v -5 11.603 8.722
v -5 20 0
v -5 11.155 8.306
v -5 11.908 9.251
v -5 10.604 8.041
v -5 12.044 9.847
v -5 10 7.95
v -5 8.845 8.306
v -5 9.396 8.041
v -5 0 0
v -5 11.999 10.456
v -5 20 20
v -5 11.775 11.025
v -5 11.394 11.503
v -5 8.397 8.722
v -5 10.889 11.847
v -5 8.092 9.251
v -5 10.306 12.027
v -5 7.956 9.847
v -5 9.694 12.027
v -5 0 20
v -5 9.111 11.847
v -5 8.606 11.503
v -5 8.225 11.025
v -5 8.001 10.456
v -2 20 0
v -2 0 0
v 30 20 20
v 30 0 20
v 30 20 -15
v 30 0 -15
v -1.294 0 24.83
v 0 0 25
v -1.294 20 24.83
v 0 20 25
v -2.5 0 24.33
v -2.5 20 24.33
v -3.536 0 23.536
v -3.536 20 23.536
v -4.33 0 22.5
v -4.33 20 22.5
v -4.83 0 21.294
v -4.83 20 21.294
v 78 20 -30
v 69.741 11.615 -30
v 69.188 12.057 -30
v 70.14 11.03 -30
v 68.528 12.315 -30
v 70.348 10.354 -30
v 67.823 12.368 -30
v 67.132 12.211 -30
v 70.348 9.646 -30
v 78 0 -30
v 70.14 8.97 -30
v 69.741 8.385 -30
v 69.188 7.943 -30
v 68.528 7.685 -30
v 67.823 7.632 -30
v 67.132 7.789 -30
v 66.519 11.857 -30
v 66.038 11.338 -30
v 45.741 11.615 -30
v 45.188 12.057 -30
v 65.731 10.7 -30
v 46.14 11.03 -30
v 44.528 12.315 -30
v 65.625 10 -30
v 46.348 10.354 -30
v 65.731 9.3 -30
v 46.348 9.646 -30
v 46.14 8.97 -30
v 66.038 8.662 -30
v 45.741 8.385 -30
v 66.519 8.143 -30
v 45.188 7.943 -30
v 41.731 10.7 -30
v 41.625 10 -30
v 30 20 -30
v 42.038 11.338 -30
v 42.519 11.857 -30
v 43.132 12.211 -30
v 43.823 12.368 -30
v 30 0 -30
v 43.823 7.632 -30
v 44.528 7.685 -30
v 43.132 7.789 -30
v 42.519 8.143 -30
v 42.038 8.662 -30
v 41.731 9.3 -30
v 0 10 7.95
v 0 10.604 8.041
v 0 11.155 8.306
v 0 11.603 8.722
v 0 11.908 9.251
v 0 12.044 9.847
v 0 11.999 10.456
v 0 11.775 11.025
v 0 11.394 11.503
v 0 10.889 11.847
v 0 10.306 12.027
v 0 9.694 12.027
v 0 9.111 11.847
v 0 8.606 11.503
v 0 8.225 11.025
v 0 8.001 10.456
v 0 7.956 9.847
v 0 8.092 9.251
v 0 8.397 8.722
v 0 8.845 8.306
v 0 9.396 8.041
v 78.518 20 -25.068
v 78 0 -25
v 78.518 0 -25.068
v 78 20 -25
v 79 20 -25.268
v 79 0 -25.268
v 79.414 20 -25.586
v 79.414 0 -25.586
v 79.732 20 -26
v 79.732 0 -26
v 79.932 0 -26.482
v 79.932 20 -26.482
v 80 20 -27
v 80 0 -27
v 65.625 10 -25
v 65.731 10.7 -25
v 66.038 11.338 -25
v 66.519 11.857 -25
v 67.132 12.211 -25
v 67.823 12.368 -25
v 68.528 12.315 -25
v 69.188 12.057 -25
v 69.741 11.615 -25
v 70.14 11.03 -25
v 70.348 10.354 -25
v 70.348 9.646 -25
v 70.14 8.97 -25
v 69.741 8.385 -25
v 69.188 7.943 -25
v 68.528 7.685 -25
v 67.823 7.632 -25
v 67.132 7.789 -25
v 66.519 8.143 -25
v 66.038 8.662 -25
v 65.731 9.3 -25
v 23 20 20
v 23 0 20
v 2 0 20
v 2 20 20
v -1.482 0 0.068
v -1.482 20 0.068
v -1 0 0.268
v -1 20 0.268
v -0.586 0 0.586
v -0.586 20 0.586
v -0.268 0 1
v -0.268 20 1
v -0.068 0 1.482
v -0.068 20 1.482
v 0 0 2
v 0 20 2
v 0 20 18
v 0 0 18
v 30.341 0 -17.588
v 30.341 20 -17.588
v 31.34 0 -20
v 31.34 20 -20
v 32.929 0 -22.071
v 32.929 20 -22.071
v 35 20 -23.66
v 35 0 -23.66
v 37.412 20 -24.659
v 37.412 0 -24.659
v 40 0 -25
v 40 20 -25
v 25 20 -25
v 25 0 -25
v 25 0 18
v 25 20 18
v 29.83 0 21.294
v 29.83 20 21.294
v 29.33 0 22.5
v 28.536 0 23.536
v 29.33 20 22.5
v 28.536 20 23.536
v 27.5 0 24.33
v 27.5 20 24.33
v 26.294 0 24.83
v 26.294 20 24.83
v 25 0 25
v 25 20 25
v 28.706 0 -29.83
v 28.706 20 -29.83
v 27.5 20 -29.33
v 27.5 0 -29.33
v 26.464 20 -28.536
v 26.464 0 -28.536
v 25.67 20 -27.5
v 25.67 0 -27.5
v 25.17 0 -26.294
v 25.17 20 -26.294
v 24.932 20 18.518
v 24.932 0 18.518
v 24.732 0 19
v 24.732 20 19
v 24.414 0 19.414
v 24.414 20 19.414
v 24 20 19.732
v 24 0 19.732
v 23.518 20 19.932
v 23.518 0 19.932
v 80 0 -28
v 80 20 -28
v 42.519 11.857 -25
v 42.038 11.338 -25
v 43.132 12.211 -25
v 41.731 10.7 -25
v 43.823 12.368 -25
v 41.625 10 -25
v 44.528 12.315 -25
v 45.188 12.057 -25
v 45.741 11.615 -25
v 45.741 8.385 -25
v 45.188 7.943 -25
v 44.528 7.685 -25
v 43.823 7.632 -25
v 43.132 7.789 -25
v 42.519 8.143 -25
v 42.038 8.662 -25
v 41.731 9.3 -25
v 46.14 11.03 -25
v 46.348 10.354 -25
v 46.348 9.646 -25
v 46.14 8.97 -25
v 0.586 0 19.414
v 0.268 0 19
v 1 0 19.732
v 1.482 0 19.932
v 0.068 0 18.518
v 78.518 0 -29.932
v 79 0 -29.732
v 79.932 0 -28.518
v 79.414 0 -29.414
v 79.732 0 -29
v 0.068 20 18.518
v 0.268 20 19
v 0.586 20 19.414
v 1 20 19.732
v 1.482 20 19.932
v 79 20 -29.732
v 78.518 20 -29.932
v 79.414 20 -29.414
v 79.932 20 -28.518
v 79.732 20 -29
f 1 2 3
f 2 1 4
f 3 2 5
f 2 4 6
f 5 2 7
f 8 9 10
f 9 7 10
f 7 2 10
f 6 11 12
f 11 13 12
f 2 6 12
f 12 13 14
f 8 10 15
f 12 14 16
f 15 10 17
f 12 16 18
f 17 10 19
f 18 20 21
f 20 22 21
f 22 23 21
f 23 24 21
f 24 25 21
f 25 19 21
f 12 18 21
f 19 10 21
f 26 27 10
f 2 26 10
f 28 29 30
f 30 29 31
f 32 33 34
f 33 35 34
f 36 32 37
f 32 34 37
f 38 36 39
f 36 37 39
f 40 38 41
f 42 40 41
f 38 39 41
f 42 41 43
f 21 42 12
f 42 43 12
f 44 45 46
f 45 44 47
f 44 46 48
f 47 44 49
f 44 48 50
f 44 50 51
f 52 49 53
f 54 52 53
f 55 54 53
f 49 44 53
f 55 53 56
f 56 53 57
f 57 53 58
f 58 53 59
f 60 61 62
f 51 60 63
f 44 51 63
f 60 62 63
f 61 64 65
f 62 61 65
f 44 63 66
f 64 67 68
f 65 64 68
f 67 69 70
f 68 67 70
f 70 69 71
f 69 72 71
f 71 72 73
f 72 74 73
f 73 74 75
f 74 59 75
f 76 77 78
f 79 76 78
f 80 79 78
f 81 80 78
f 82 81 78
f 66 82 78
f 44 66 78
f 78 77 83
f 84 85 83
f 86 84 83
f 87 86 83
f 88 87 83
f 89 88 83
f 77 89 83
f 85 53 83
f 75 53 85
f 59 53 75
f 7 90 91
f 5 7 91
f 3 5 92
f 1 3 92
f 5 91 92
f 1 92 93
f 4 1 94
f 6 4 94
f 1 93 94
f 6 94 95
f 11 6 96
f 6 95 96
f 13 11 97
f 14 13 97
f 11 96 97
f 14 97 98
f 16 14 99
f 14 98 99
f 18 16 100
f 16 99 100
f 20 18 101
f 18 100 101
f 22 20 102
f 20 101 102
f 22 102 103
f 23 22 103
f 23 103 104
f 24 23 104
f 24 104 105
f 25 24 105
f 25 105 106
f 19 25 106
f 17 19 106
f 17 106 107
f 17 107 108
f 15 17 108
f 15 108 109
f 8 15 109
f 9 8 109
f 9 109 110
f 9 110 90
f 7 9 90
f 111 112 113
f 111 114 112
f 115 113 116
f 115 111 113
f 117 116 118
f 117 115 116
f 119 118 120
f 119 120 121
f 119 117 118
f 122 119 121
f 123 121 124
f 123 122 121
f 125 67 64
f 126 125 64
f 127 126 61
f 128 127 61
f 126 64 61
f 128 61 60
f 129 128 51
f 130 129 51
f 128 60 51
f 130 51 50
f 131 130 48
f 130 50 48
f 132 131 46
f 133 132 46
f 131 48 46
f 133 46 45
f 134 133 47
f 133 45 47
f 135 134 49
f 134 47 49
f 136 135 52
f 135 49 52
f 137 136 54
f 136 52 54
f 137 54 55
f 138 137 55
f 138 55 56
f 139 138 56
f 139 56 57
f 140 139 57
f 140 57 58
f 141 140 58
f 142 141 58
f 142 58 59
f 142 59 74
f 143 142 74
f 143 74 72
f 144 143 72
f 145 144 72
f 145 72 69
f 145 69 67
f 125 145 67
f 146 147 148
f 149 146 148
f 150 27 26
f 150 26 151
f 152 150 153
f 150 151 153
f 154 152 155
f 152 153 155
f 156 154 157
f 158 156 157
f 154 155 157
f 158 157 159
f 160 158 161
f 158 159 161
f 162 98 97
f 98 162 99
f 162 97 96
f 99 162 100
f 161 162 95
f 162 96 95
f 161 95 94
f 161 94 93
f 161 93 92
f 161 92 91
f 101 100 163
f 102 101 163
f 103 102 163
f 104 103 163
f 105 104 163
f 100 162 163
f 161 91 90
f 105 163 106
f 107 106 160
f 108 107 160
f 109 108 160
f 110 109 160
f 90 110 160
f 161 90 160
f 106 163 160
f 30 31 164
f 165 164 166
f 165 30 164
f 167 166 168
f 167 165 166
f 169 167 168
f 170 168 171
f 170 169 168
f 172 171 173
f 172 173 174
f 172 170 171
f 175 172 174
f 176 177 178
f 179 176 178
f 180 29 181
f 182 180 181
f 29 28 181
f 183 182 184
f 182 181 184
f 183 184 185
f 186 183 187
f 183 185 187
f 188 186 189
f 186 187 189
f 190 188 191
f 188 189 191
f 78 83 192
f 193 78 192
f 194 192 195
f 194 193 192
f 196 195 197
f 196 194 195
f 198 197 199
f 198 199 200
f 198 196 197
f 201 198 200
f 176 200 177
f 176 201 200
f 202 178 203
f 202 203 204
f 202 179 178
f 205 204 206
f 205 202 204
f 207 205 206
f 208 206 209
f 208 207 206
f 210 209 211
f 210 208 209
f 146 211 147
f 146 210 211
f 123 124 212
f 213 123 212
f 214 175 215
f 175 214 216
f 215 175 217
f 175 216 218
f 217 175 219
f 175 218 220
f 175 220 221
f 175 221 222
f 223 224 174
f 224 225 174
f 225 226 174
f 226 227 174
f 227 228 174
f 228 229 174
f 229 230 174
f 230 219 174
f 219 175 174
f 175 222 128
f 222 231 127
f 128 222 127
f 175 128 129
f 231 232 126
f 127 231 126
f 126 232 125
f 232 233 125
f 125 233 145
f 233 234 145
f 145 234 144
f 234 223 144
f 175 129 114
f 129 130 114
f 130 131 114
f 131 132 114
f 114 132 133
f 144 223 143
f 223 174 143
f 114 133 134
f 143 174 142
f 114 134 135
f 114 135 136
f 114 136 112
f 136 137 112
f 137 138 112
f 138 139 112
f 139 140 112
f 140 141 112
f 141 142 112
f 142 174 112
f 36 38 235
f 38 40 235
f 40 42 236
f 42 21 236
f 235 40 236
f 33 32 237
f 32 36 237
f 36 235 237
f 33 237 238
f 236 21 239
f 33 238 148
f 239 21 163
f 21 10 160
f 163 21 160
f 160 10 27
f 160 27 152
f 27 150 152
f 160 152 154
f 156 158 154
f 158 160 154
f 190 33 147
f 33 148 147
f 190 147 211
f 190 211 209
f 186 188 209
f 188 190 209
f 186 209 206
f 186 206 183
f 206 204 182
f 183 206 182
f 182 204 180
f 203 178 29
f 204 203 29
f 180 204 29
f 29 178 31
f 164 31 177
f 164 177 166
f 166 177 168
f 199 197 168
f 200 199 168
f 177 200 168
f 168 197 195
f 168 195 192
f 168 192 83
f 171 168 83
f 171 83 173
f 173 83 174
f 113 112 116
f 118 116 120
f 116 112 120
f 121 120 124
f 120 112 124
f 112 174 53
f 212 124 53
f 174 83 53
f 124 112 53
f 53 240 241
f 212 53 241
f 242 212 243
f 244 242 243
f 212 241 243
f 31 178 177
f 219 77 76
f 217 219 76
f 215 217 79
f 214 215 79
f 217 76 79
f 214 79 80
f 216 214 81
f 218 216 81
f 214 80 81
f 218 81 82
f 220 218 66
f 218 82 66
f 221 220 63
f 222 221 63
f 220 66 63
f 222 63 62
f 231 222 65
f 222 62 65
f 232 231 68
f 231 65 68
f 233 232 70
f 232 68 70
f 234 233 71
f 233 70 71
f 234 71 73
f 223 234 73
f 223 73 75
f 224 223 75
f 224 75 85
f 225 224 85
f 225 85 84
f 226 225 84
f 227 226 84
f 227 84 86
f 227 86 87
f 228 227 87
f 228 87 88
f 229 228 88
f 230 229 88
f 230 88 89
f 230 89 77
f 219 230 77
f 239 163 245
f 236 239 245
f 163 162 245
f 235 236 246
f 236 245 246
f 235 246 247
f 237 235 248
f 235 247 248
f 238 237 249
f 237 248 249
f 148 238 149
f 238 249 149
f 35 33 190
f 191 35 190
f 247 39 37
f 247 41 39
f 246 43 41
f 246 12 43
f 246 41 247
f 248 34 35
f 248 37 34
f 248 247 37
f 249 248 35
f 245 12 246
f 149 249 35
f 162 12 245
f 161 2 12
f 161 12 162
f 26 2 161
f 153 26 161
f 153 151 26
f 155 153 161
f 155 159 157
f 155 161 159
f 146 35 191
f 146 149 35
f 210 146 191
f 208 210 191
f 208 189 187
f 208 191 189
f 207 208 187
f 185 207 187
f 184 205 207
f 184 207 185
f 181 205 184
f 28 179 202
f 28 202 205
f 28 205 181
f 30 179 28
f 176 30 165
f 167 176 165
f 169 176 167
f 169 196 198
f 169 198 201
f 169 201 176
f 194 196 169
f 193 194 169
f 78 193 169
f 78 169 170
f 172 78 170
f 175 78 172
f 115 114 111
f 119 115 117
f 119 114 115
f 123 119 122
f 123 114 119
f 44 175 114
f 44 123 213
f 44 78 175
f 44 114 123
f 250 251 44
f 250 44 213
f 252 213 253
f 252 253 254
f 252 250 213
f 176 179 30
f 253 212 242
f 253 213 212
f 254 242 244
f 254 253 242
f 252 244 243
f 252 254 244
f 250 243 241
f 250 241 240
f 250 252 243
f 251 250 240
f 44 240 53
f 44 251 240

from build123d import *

# Parameters (mm, degrees)
BOSS_EXTRUDE1_DEPTH = 20
SKETCH2_R           = 2.05
CUT_EXTRUDE1_DEPTH  = 88.749643874
SKETCH3_R           = 2.375
CUT_EXTRUDE2_DEPTH  = 100.121138008
FILLET1_R           = 10
FILLET2_R           = 5
FILLET3_R           = 2


with BuildPart() as part:
    # Sketch1 → Boss-Extrude1 (new body)
    with BuildSketch(Plane(origin=(0, 0, 0), x_dir=(1, 0, 0), z_dir=(0, 1, 0))):
        Polygon((0, 0), (-5, 0), (-5, -25), (30, -25), (30, -0.579896907), (30, 25), (80, 25), (80, 30), (25, 30), (25, -20), (0, -20), align=None)
    extrude(amount=BOSS_EXTRUDE1_DEPTH)

    # Sketch2 → Cut-Extrude1 (cut, through all)
    with BuildSketch(Plane(origin=(0, 0, 0), x_dir=(0, 0, -1), z_dir=(1, 0, 0))):
        with Locations((-10, 10)):
            Circle(SKETCH2_R)
    extrude(amount=-CUT_EXTRUDE1_DEPTH, mode=Mode.SUBTRACT)

    # Sketch3 → Cut-Extrude2 (cut, through all)
    with BuildSketch(Plane(origin=(0, 0, -30), x_dir=(-1, 0, 0), z_dir=(0, 0, -1))):
        with Locations((-68, 10)):
            Circle(SKETCH3_R)
        with Locations((-44, 10)):
            Circle(SKETCH3_R)
    extrude(amount=-CUT_EXTRUDE2_DEPTH, mode=Mode.SUBTRACT)

    # Fillet1
    fillet1_edges = [part.edges().sort_by_distance(p)[0] for p in [
        (30, 10, -25),
    ]]
    fillet(fillet1_edges, radius=FILLET1_R)

    # Fillet2
    fillet2_edges = [part.edges().sort_by_distance(p)[0] for p in [
        (25, 10, -30),
        (30, 10, 25),
        (-5, 10, 25),
    ]]
    fillet(fillet2_edges, radius=FILLET2_R)

    # Fillet3
    fillet3_edges = [part.edges().sort_by_distance(p)[0] for p in [
        (0, 10, 20),
        (25, 10, 20),
        (80, 10, -30),
        (80, 10, -25),
        (0, 10, 0),
    ]]
    fillet(fillet3_edges, radius=FILLET3_R)


solid = part.part
